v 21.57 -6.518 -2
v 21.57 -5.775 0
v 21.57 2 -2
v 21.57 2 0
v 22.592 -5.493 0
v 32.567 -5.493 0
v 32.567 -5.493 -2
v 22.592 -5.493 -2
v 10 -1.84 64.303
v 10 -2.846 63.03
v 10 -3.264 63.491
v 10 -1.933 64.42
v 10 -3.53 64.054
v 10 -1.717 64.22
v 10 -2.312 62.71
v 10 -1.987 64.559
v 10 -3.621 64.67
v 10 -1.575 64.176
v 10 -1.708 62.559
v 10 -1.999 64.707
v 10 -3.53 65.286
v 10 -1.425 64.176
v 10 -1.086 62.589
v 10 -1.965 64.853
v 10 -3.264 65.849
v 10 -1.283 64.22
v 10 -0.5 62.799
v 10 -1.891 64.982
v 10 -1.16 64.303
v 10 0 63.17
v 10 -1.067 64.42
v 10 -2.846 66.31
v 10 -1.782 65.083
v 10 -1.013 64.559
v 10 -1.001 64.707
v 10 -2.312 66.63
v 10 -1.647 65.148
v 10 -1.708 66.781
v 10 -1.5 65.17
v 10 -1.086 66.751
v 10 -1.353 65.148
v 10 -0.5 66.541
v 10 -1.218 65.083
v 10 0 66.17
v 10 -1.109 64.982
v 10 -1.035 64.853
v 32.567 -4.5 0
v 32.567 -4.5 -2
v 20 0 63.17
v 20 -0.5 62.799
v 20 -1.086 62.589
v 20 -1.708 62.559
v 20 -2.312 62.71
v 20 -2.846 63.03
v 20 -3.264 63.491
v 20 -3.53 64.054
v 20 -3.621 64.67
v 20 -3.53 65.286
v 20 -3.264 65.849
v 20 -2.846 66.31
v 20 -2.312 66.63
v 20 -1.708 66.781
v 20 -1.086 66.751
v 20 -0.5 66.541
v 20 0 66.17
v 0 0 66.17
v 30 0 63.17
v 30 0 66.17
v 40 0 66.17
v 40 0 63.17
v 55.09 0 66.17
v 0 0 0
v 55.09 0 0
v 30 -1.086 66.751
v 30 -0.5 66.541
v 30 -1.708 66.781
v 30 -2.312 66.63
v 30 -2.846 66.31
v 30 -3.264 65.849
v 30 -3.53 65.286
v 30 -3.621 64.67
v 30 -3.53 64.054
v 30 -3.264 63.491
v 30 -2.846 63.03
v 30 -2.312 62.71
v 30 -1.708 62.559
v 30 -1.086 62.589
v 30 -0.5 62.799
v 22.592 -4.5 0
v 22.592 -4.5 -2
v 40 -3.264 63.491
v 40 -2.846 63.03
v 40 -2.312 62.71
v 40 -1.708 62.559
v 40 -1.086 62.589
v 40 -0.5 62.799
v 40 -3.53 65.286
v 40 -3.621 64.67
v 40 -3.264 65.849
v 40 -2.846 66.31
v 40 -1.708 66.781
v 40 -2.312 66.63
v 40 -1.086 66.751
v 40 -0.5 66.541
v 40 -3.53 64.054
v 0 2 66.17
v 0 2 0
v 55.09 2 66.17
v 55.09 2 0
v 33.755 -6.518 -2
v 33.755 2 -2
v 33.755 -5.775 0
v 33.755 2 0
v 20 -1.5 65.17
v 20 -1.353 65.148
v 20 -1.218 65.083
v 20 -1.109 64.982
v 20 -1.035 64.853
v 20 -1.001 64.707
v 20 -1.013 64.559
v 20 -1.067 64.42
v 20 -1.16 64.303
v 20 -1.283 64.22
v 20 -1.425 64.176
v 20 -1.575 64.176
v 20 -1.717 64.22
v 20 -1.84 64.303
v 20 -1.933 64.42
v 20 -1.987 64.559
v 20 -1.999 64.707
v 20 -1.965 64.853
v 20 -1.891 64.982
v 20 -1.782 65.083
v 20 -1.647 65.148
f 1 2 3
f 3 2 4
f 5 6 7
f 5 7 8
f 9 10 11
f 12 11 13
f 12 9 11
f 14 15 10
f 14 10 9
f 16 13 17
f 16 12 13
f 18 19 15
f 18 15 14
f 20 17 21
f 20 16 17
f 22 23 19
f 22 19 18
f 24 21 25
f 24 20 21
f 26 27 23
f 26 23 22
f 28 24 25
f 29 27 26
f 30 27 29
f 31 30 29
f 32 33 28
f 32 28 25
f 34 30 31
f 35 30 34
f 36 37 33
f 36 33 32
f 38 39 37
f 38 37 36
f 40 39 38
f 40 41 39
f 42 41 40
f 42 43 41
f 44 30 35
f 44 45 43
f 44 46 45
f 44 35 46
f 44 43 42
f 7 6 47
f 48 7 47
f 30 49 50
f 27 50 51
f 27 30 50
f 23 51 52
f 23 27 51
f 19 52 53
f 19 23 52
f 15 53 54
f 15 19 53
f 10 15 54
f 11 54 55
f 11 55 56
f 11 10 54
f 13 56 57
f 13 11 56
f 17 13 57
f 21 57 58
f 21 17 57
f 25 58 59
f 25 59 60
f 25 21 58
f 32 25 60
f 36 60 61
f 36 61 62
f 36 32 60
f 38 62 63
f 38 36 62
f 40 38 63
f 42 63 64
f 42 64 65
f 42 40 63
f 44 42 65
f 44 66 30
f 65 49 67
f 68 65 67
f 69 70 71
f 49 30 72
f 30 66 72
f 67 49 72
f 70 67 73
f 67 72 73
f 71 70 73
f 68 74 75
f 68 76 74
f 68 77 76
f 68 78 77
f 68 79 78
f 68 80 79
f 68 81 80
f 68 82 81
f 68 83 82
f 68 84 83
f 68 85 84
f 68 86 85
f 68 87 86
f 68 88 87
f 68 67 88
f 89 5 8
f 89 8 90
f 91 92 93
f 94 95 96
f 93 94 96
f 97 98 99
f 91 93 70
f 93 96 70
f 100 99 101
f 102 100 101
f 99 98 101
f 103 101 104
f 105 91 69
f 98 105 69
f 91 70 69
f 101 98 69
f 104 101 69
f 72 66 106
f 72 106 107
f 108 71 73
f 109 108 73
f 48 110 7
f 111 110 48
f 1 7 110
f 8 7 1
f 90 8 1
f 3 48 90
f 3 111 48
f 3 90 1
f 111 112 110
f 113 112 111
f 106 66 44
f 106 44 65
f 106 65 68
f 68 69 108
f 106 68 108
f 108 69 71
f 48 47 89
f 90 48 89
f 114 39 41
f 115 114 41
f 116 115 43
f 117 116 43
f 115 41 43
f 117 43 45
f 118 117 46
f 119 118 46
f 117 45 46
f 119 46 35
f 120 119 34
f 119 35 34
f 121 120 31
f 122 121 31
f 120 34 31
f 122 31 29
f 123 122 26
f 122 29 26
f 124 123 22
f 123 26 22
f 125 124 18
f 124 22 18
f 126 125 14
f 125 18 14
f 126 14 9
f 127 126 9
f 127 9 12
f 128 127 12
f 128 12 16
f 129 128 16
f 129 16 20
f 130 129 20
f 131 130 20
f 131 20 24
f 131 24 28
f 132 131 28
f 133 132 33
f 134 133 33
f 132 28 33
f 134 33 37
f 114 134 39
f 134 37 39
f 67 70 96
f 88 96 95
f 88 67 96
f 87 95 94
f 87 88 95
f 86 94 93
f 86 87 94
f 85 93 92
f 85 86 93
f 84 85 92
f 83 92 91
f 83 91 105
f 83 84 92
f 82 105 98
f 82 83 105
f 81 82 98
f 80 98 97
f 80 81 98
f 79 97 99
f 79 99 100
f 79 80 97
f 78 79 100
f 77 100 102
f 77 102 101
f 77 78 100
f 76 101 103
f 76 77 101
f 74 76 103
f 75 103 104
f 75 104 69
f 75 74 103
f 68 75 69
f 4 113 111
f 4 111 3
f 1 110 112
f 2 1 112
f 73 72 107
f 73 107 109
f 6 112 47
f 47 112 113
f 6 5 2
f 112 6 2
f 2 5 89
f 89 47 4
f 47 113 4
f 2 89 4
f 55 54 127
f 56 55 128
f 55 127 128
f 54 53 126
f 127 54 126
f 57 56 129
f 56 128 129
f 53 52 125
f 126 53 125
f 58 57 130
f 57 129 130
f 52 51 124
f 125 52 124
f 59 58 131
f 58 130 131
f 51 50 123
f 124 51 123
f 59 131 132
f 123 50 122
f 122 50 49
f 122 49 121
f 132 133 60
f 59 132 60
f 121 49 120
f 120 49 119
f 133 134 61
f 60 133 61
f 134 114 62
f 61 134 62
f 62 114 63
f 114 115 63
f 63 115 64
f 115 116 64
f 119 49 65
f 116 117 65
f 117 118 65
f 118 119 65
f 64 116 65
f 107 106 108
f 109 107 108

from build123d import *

# Parameters (mm, degrees)
SKETCH1_W               = 55.09
SKETCH1_H               = 66.17
BOSS_EXTRUDE1_DEPTH     = 2
SKETCH2_R               = 2.121320344
SKETCH2_R_2             = 0.5
BOSS_EXTRUDE2_DEPTH     = 10
SKETCH3_R               = 2.121320344
BOSS_EXTRUDE3_DEPTH     = 10
SKETCH4_W               = 12.184728623
SKETCH4_H               = 8.517734669
SKETCH4_W_2             = 9.974925384
SKETCH4_H_2             = 0.993258381
BOSS_EXTRUDE4_DEPTH     = 2
CUT_EXTRUDE1_DEPTH      = 76.014272697
CUT_EXTRUDE1_DEPTH_BACK = 76.014272697


with BuildPart() as part:
    # Sketch1 → Boss-Extrude1 (new body)
    with BuildSketch(Plane(origin=(0, 0, 0), x_dir=(1, 0, 0), z_dir=(0, 1, 0))):
        with Locations((27.545, -33.085)):
            Rectangle(SKETCH1_W, SKETCH1_H)
    extrude(amount=BOSS_EXTRUDE1_DEPTH)

    # Sketch2 → Boss-Extrude2 (add)
    with BuildSketch(Plane.ZY.offset(-10)):
        with Locations((64.67, -1.5)):
            Circle(SKETCH2_R)
        with Locations((64.67, -1.5)):
            Circle(SKETCH2_R_2, mode=Mode.SUBTRACT)
    extrude(amount=-BOSS_EXTRUDE2_DEPTH)

    # Sketch3 → Boss-Extrude3 (add)
    with BuildSketch(Plane.ZY.offset(-30)):
        with Locations((64.67, -1.5)):
            Circle(SKETCH3_R)
    extrude(amount=-BOSS_EXTRUDE3_DEPTH)


with BuildPart() as body_2:
    # Sketch4 → Boss-Extrude4 (new body)
    with BuildSketch(Plane(origin=(0, 0, 0), x_dir=(-1, 0, 0), z_dir=(0, 0, -1))):
        with Locations((-27.662522877, -2.258867335)):
            Rectangle(SKETCH4_W, SKETCH4_H)
        with Locations((-27.57912851, -4.996629191)):
            Rectangle(SKETCH4_W_2, SKETCH4_H_2, mode=Mode.SUBTRACT)
    extrude(amount=BOSS_EXTRUDE4_DEPTH)

    # Sketch6 → Cut-Extrude1 (cut, two sides: drawn at the far end of the back side and taken through both)
    with BuildSketch(Plane.ZY.offset(-21.570158565).offset(-CUT_EXTRUDE1_DEPTH_BACK)):
        Polygon((-2, -6.517734669), (0, -5.775216088), (0, -6.517734669), align=None)
    extrude(amount=CUT_EXTRUDE1_DEPTH + CUT_EXTRUDE1_DEPTH_BACK, mode=Mode.SUBTRACT)


solid = Compound([part.part, body_2.part])
